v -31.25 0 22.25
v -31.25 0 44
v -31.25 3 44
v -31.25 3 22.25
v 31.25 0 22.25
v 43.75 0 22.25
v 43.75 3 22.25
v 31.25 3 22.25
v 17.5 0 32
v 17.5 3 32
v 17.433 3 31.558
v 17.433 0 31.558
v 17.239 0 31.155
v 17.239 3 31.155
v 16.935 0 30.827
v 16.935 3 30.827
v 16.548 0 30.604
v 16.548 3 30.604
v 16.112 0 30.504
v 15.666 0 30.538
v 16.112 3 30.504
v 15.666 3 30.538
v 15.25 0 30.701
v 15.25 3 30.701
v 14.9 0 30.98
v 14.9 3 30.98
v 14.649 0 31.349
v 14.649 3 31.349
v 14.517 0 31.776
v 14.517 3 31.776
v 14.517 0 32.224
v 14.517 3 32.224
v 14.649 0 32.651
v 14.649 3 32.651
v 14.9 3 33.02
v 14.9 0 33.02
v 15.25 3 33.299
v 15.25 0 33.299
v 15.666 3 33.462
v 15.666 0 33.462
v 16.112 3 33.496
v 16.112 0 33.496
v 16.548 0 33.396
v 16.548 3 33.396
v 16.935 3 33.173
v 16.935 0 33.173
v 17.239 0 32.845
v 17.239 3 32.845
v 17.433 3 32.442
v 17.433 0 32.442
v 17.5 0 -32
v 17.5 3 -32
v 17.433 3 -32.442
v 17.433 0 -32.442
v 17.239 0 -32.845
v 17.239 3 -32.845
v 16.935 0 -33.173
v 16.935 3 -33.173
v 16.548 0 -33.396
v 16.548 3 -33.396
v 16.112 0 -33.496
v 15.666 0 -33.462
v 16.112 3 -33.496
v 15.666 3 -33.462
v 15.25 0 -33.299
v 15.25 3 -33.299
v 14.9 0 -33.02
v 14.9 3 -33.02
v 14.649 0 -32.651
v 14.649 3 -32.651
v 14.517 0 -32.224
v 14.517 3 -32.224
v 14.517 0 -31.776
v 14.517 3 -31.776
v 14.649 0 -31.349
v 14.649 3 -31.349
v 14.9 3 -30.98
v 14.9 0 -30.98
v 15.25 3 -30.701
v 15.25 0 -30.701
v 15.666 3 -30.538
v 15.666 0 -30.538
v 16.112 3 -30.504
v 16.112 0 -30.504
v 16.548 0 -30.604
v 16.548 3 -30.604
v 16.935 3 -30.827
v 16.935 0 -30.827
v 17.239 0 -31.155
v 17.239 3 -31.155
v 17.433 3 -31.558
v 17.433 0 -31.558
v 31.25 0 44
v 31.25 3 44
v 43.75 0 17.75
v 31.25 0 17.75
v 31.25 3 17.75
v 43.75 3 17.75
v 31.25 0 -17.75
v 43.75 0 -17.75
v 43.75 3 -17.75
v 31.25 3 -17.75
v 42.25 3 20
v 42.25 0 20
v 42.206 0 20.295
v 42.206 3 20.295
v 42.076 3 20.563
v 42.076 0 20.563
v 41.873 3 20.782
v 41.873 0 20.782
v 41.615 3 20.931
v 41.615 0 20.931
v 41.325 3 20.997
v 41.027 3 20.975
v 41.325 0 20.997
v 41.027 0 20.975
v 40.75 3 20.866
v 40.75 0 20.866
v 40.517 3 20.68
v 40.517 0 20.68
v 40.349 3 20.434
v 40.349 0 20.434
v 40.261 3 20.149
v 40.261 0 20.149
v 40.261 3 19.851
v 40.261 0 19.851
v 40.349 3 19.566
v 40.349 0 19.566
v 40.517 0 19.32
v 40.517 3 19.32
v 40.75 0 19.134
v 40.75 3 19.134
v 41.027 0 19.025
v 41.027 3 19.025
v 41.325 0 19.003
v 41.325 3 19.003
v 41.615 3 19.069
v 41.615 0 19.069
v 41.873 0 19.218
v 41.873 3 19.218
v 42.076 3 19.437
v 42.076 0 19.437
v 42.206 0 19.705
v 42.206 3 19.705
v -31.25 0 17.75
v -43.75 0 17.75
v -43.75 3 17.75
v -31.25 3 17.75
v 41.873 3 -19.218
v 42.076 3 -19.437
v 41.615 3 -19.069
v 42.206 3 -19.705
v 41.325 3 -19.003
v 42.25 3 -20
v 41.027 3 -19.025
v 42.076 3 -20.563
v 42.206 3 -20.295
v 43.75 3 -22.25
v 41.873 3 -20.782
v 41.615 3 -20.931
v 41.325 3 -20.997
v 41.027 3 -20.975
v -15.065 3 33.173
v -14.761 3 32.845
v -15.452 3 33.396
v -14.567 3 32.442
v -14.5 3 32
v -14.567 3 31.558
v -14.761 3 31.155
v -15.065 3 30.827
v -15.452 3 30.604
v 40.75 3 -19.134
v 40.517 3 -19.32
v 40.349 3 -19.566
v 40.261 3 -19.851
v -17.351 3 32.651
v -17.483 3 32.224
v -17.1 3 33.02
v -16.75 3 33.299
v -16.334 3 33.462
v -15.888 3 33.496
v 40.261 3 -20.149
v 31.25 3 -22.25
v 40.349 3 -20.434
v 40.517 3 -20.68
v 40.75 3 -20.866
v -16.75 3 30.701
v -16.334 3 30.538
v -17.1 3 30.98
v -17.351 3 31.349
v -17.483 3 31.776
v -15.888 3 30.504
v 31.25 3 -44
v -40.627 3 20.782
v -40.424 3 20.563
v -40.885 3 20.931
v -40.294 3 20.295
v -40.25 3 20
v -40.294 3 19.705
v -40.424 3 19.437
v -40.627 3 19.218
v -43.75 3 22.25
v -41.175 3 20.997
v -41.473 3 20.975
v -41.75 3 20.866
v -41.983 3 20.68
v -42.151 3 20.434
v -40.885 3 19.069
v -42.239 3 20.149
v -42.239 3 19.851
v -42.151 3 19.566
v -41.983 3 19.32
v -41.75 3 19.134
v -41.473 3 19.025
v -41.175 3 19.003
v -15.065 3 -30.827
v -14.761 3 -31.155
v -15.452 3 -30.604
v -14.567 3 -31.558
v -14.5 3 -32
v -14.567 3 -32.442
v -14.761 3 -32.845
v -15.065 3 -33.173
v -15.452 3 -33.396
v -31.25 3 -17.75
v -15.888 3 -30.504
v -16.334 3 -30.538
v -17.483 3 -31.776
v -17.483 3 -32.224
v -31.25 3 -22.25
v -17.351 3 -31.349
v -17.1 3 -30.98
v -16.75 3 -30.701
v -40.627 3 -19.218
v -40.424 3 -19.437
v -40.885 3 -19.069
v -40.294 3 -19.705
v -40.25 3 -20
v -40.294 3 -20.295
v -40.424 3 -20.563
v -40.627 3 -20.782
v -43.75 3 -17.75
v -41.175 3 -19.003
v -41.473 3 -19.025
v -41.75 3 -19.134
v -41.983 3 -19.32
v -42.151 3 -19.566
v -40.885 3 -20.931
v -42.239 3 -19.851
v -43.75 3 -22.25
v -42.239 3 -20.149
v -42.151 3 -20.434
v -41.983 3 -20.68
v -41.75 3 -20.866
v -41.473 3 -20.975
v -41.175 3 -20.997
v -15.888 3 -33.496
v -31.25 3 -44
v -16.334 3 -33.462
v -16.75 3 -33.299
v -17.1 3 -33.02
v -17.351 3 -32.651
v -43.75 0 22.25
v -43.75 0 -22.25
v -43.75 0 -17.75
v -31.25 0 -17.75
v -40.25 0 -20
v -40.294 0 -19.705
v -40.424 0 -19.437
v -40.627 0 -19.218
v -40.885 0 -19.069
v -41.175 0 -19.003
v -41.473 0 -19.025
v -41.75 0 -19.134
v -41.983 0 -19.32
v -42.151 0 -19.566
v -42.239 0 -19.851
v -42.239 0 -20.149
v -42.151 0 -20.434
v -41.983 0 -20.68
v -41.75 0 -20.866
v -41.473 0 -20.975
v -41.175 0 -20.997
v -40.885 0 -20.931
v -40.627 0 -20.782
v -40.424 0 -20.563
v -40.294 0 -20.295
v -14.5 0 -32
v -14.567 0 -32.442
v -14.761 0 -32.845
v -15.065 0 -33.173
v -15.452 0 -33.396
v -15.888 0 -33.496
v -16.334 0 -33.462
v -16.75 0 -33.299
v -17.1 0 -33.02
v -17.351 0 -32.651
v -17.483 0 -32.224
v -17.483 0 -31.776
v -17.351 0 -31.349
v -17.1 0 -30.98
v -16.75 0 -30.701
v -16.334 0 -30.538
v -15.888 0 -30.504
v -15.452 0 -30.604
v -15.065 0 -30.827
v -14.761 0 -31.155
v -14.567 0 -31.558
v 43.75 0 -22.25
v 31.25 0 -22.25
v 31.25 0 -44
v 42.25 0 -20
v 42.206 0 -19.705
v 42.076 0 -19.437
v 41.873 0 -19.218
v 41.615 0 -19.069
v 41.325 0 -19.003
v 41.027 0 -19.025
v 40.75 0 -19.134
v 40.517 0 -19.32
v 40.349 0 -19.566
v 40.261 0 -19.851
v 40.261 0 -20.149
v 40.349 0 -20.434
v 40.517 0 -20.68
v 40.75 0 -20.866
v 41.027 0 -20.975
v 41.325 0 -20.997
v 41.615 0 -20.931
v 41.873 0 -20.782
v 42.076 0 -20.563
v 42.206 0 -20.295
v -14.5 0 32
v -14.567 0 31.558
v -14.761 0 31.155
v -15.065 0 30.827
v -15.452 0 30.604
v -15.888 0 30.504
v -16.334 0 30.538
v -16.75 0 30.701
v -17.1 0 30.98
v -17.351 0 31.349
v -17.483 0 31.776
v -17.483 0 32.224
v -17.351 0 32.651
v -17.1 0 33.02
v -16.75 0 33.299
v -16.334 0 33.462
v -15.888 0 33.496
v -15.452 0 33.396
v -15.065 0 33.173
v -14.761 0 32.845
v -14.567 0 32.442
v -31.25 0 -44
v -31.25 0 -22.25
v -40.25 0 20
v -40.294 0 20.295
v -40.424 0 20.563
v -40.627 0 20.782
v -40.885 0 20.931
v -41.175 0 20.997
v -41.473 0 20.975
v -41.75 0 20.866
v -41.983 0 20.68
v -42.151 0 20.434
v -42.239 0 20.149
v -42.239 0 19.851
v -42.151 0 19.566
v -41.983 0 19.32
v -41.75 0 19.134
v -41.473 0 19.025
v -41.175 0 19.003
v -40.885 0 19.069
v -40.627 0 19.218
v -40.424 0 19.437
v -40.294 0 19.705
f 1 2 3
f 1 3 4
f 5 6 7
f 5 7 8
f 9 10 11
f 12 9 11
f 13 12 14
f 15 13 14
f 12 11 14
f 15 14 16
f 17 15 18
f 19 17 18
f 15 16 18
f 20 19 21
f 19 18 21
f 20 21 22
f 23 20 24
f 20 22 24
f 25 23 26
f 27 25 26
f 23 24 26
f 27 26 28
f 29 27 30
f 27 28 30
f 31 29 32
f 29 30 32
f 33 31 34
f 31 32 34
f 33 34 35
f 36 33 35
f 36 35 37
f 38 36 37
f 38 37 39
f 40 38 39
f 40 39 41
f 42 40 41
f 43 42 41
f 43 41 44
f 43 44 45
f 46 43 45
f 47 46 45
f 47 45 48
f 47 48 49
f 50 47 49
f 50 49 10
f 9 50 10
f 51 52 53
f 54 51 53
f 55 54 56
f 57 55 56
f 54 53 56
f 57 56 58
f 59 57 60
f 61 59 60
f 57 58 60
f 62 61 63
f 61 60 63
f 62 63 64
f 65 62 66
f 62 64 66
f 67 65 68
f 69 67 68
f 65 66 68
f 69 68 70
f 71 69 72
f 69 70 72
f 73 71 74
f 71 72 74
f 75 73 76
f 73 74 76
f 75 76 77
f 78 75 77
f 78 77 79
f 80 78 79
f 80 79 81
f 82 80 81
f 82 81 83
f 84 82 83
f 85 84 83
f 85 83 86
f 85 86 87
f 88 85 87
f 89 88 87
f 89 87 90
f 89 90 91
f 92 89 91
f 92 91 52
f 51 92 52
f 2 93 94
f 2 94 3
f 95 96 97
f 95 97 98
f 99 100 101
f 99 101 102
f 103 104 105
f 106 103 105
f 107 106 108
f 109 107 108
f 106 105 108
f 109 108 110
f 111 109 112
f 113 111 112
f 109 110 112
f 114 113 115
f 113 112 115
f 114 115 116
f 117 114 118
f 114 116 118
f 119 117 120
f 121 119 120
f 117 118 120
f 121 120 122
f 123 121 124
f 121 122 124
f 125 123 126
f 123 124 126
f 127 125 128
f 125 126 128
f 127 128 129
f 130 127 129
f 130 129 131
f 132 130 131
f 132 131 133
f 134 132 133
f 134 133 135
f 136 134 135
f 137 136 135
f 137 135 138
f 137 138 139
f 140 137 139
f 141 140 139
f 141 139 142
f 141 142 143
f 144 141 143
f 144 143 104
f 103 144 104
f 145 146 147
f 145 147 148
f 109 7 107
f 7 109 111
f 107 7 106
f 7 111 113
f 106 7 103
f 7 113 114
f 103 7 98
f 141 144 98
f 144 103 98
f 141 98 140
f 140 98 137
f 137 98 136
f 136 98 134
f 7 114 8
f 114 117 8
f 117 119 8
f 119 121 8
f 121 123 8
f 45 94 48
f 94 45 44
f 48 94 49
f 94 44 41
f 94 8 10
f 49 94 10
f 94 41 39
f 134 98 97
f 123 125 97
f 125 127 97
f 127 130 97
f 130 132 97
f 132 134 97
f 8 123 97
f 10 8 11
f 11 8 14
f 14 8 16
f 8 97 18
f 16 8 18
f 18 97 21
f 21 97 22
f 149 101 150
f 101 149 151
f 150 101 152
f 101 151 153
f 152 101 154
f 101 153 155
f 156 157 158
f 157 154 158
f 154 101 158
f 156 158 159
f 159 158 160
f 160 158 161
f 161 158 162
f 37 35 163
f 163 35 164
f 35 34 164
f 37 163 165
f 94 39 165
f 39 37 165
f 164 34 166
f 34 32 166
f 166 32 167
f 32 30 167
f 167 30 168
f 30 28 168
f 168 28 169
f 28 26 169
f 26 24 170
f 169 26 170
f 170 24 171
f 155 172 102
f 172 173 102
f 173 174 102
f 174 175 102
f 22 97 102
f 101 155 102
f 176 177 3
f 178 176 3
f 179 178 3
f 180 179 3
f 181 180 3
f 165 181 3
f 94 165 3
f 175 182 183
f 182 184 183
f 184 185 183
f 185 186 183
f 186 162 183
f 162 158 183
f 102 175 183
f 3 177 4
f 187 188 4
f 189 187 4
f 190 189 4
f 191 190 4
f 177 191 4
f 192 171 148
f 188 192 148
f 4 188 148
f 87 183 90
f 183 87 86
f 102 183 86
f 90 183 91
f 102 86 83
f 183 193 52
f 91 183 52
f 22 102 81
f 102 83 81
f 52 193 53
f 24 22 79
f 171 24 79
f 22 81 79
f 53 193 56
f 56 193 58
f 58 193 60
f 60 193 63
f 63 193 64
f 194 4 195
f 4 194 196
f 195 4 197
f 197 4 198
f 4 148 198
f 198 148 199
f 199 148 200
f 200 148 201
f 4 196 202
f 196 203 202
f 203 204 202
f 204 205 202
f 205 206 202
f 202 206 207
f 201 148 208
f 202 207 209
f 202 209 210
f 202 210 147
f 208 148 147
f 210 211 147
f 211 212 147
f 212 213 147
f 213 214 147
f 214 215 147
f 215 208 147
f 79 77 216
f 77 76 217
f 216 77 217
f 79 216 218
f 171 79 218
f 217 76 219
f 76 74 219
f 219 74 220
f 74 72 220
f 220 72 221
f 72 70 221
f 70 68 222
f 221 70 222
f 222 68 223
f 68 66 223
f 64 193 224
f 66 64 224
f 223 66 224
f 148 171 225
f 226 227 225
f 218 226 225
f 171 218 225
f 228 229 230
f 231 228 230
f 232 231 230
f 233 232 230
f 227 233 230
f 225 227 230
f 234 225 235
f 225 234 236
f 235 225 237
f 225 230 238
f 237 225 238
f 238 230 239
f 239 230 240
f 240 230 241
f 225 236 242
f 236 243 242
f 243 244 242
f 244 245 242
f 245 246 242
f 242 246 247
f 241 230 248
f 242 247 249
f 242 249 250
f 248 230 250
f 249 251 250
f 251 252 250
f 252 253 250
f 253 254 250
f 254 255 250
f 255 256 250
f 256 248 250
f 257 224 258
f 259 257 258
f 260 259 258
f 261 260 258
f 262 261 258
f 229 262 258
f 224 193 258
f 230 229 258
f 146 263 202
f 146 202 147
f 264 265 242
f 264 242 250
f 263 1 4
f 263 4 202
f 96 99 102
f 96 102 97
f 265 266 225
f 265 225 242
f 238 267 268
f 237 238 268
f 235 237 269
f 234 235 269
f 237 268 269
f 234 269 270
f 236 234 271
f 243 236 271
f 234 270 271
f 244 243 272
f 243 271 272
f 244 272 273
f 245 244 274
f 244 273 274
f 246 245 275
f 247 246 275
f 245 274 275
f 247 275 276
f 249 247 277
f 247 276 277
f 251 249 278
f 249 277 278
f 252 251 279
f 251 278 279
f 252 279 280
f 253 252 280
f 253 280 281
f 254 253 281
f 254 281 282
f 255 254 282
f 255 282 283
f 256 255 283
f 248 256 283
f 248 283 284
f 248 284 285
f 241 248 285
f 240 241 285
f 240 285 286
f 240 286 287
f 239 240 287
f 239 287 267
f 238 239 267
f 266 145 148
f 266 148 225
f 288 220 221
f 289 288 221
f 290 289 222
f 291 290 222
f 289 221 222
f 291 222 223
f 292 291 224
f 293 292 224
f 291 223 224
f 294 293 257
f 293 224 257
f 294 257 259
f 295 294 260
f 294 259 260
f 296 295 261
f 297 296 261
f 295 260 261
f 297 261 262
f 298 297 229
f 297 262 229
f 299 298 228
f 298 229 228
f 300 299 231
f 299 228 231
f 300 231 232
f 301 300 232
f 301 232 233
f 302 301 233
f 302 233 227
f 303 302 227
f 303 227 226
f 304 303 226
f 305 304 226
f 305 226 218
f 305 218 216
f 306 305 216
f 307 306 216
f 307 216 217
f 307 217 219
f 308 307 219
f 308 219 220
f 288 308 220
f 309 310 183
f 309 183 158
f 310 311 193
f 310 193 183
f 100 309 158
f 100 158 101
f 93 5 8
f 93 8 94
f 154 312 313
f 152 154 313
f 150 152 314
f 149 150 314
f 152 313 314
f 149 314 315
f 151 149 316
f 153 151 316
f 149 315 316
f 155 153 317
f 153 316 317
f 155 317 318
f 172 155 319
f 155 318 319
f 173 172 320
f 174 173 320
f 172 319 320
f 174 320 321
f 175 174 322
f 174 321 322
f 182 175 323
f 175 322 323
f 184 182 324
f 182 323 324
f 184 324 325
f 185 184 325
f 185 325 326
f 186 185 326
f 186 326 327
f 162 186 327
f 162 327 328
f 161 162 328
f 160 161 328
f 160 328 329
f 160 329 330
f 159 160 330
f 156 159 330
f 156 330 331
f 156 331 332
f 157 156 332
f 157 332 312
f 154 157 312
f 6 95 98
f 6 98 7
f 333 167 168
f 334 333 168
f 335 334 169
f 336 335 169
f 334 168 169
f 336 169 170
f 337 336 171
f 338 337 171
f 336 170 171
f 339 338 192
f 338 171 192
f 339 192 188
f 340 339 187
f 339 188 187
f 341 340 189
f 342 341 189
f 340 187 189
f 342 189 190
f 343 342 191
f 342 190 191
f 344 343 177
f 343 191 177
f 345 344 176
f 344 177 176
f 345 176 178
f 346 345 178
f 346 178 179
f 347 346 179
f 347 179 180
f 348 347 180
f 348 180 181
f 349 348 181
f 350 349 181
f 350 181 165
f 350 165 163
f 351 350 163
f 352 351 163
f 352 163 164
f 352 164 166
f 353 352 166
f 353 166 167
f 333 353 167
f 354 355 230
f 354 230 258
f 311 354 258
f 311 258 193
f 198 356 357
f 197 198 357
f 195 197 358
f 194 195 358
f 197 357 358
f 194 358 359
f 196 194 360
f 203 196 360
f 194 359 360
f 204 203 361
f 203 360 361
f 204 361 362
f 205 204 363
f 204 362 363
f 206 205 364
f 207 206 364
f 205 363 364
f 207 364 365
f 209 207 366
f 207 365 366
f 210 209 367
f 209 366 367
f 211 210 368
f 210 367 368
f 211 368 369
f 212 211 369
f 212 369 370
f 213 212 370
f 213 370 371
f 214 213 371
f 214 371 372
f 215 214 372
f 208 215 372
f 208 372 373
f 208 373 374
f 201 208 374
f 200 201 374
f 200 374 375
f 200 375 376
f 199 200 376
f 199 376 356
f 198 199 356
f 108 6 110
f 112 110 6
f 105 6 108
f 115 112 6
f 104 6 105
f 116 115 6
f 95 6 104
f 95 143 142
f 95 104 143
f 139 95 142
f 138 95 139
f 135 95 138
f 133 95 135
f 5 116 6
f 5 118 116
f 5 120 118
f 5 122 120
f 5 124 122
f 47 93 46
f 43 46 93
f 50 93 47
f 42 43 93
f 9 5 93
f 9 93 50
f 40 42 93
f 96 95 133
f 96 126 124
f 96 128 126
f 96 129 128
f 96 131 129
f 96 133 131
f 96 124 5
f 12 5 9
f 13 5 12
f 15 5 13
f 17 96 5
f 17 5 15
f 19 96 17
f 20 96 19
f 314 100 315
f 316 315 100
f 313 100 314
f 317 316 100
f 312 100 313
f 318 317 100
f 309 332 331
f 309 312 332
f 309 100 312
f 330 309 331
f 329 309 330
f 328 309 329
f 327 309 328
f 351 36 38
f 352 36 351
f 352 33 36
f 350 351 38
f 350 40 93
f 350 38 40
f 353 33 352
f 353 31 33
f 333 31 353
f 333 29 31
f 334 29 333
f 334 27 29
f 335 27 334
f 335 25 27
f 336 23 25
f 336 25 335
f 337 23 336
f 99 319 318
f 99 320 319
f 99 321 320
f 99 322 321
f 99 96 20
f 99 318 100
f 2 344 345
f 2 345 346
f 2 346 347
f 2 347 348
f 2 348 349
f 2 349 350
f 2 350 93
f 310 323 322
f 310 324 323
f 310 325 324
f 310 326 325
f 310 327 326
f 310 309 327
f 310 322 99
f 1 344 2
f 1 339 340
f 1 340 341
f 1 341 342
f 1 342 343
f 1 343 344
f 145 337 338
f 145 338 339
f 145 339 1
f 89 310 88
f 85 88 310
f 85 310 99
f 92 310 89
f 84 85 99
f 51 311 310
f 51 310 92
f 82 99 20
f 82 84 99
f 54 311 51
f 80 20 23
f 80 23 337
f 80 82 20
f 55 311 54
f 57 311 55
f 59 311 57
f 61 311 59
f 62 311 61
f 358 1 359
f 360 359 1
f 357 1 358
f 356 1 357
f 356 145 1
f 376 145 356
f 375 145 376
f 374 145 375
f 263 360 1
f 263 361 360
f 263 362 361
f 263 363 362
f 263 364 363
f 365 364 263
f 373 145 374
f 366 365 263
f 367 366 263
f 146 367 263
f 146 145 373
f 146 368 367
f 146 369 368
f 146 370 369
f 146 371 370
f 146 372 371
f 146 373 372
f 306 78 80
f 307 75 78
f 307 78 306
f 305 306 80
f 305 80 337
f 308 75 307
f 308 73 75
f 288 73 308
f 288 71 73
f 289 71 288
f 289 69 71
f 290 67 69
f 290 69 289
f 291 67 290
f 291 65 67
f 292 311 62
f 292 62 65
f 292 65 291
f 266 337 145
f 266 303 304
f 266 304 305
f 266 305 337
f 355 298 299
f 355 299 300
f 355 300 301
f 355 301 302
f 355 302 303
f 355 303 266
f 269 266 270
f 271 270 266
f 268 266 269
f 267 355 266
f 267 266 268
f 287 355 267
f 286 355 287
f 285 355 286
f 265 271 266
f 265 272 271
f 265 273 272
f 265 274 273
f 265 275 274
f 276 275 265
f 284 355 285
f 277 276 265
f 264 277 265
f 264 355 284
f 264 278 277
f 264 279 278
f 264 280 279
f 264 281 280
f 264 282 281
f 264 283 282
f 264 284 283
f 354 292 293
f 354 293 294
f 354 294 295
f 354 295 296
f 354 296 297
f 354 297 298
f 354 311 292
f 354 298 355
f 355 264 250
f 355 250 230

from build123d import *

# Parameters (mm, degrees)
BOSS_EXTRUDE1_DEPTH = 3
SKETCH2_R           = 1
CUT_EXTRUDE1_DEPTH  = 6
SKETCH3_R           = 1.5
CUT_EXTRUDE2_DEPTH  = 10


with BuildPart() as part:
    # Sketch1 → Boss-Extrude1 (new body)
    with BuildSketch(Plane(origin=(0, 0, 0), x_dir=(1, 0, 0), z_dir=(0, 1, 0))):
        Polygon((-43.75, 22.25), (-31.25, 22.25), (-31.25, 44), (31.25, 44), (31.25, 22.25), (43.75, 22.25), (43.75, 17.75), (31.25, 17.75), (31.25, -17.75), (43.75, -17.75), (43.75, -22.25), (31.25, -22.25), (31.25, -44), (-31.25, -44), (-31.25, -22.25), (-43.75, -22.25), (-43.75, -17.75), (-31.25, -17.75), (-31.25, 17.75), (-43.75, 17.75), align=None)
    extrude(amount=BOSS_EXTRUDE1_DEPTH)

    # Sketch2 → Cut-Extrude1 (cut)
    with BuildSketch(Plane.XZ):
        with Locations((-41.25, 20)):
            Circle(SKETCH2_R)
        with Locations((-41.25, -20)):
            Circle(SKETCH2_R)
        with Locations((41.25, -20)):
            Circle(SKETCH2_R)
        with Locations((41.25, 20)):
            Circle(SKETCH2_R)
    extrude(amount=-CUT_EXTRUDE1_DEPTH, mode=Mode.SUBTRACT)

    # Sketch3 → Cut-Extrude2 (cut)
    with BuildSketch(Plane(origin=(0, 3, 0), x_dir=(1, 0, 0), z_dir=(0, 1, 0))):
        with Locations((-16, 32)):
            Circle(SKETCH3_R)
        with Locations((16, 32)):
            Circle(SKETCH3_R)
        with Locations((16, -32)):
            Circle(SKETCH3_R)
        with Locations((-16, -32)):
            Circle(SKETCH3_R)
    extrude(amount=-CUT_EXTRUDE2_DEPTH, mode=Mode.SUBTRACT)


solid = part.part
